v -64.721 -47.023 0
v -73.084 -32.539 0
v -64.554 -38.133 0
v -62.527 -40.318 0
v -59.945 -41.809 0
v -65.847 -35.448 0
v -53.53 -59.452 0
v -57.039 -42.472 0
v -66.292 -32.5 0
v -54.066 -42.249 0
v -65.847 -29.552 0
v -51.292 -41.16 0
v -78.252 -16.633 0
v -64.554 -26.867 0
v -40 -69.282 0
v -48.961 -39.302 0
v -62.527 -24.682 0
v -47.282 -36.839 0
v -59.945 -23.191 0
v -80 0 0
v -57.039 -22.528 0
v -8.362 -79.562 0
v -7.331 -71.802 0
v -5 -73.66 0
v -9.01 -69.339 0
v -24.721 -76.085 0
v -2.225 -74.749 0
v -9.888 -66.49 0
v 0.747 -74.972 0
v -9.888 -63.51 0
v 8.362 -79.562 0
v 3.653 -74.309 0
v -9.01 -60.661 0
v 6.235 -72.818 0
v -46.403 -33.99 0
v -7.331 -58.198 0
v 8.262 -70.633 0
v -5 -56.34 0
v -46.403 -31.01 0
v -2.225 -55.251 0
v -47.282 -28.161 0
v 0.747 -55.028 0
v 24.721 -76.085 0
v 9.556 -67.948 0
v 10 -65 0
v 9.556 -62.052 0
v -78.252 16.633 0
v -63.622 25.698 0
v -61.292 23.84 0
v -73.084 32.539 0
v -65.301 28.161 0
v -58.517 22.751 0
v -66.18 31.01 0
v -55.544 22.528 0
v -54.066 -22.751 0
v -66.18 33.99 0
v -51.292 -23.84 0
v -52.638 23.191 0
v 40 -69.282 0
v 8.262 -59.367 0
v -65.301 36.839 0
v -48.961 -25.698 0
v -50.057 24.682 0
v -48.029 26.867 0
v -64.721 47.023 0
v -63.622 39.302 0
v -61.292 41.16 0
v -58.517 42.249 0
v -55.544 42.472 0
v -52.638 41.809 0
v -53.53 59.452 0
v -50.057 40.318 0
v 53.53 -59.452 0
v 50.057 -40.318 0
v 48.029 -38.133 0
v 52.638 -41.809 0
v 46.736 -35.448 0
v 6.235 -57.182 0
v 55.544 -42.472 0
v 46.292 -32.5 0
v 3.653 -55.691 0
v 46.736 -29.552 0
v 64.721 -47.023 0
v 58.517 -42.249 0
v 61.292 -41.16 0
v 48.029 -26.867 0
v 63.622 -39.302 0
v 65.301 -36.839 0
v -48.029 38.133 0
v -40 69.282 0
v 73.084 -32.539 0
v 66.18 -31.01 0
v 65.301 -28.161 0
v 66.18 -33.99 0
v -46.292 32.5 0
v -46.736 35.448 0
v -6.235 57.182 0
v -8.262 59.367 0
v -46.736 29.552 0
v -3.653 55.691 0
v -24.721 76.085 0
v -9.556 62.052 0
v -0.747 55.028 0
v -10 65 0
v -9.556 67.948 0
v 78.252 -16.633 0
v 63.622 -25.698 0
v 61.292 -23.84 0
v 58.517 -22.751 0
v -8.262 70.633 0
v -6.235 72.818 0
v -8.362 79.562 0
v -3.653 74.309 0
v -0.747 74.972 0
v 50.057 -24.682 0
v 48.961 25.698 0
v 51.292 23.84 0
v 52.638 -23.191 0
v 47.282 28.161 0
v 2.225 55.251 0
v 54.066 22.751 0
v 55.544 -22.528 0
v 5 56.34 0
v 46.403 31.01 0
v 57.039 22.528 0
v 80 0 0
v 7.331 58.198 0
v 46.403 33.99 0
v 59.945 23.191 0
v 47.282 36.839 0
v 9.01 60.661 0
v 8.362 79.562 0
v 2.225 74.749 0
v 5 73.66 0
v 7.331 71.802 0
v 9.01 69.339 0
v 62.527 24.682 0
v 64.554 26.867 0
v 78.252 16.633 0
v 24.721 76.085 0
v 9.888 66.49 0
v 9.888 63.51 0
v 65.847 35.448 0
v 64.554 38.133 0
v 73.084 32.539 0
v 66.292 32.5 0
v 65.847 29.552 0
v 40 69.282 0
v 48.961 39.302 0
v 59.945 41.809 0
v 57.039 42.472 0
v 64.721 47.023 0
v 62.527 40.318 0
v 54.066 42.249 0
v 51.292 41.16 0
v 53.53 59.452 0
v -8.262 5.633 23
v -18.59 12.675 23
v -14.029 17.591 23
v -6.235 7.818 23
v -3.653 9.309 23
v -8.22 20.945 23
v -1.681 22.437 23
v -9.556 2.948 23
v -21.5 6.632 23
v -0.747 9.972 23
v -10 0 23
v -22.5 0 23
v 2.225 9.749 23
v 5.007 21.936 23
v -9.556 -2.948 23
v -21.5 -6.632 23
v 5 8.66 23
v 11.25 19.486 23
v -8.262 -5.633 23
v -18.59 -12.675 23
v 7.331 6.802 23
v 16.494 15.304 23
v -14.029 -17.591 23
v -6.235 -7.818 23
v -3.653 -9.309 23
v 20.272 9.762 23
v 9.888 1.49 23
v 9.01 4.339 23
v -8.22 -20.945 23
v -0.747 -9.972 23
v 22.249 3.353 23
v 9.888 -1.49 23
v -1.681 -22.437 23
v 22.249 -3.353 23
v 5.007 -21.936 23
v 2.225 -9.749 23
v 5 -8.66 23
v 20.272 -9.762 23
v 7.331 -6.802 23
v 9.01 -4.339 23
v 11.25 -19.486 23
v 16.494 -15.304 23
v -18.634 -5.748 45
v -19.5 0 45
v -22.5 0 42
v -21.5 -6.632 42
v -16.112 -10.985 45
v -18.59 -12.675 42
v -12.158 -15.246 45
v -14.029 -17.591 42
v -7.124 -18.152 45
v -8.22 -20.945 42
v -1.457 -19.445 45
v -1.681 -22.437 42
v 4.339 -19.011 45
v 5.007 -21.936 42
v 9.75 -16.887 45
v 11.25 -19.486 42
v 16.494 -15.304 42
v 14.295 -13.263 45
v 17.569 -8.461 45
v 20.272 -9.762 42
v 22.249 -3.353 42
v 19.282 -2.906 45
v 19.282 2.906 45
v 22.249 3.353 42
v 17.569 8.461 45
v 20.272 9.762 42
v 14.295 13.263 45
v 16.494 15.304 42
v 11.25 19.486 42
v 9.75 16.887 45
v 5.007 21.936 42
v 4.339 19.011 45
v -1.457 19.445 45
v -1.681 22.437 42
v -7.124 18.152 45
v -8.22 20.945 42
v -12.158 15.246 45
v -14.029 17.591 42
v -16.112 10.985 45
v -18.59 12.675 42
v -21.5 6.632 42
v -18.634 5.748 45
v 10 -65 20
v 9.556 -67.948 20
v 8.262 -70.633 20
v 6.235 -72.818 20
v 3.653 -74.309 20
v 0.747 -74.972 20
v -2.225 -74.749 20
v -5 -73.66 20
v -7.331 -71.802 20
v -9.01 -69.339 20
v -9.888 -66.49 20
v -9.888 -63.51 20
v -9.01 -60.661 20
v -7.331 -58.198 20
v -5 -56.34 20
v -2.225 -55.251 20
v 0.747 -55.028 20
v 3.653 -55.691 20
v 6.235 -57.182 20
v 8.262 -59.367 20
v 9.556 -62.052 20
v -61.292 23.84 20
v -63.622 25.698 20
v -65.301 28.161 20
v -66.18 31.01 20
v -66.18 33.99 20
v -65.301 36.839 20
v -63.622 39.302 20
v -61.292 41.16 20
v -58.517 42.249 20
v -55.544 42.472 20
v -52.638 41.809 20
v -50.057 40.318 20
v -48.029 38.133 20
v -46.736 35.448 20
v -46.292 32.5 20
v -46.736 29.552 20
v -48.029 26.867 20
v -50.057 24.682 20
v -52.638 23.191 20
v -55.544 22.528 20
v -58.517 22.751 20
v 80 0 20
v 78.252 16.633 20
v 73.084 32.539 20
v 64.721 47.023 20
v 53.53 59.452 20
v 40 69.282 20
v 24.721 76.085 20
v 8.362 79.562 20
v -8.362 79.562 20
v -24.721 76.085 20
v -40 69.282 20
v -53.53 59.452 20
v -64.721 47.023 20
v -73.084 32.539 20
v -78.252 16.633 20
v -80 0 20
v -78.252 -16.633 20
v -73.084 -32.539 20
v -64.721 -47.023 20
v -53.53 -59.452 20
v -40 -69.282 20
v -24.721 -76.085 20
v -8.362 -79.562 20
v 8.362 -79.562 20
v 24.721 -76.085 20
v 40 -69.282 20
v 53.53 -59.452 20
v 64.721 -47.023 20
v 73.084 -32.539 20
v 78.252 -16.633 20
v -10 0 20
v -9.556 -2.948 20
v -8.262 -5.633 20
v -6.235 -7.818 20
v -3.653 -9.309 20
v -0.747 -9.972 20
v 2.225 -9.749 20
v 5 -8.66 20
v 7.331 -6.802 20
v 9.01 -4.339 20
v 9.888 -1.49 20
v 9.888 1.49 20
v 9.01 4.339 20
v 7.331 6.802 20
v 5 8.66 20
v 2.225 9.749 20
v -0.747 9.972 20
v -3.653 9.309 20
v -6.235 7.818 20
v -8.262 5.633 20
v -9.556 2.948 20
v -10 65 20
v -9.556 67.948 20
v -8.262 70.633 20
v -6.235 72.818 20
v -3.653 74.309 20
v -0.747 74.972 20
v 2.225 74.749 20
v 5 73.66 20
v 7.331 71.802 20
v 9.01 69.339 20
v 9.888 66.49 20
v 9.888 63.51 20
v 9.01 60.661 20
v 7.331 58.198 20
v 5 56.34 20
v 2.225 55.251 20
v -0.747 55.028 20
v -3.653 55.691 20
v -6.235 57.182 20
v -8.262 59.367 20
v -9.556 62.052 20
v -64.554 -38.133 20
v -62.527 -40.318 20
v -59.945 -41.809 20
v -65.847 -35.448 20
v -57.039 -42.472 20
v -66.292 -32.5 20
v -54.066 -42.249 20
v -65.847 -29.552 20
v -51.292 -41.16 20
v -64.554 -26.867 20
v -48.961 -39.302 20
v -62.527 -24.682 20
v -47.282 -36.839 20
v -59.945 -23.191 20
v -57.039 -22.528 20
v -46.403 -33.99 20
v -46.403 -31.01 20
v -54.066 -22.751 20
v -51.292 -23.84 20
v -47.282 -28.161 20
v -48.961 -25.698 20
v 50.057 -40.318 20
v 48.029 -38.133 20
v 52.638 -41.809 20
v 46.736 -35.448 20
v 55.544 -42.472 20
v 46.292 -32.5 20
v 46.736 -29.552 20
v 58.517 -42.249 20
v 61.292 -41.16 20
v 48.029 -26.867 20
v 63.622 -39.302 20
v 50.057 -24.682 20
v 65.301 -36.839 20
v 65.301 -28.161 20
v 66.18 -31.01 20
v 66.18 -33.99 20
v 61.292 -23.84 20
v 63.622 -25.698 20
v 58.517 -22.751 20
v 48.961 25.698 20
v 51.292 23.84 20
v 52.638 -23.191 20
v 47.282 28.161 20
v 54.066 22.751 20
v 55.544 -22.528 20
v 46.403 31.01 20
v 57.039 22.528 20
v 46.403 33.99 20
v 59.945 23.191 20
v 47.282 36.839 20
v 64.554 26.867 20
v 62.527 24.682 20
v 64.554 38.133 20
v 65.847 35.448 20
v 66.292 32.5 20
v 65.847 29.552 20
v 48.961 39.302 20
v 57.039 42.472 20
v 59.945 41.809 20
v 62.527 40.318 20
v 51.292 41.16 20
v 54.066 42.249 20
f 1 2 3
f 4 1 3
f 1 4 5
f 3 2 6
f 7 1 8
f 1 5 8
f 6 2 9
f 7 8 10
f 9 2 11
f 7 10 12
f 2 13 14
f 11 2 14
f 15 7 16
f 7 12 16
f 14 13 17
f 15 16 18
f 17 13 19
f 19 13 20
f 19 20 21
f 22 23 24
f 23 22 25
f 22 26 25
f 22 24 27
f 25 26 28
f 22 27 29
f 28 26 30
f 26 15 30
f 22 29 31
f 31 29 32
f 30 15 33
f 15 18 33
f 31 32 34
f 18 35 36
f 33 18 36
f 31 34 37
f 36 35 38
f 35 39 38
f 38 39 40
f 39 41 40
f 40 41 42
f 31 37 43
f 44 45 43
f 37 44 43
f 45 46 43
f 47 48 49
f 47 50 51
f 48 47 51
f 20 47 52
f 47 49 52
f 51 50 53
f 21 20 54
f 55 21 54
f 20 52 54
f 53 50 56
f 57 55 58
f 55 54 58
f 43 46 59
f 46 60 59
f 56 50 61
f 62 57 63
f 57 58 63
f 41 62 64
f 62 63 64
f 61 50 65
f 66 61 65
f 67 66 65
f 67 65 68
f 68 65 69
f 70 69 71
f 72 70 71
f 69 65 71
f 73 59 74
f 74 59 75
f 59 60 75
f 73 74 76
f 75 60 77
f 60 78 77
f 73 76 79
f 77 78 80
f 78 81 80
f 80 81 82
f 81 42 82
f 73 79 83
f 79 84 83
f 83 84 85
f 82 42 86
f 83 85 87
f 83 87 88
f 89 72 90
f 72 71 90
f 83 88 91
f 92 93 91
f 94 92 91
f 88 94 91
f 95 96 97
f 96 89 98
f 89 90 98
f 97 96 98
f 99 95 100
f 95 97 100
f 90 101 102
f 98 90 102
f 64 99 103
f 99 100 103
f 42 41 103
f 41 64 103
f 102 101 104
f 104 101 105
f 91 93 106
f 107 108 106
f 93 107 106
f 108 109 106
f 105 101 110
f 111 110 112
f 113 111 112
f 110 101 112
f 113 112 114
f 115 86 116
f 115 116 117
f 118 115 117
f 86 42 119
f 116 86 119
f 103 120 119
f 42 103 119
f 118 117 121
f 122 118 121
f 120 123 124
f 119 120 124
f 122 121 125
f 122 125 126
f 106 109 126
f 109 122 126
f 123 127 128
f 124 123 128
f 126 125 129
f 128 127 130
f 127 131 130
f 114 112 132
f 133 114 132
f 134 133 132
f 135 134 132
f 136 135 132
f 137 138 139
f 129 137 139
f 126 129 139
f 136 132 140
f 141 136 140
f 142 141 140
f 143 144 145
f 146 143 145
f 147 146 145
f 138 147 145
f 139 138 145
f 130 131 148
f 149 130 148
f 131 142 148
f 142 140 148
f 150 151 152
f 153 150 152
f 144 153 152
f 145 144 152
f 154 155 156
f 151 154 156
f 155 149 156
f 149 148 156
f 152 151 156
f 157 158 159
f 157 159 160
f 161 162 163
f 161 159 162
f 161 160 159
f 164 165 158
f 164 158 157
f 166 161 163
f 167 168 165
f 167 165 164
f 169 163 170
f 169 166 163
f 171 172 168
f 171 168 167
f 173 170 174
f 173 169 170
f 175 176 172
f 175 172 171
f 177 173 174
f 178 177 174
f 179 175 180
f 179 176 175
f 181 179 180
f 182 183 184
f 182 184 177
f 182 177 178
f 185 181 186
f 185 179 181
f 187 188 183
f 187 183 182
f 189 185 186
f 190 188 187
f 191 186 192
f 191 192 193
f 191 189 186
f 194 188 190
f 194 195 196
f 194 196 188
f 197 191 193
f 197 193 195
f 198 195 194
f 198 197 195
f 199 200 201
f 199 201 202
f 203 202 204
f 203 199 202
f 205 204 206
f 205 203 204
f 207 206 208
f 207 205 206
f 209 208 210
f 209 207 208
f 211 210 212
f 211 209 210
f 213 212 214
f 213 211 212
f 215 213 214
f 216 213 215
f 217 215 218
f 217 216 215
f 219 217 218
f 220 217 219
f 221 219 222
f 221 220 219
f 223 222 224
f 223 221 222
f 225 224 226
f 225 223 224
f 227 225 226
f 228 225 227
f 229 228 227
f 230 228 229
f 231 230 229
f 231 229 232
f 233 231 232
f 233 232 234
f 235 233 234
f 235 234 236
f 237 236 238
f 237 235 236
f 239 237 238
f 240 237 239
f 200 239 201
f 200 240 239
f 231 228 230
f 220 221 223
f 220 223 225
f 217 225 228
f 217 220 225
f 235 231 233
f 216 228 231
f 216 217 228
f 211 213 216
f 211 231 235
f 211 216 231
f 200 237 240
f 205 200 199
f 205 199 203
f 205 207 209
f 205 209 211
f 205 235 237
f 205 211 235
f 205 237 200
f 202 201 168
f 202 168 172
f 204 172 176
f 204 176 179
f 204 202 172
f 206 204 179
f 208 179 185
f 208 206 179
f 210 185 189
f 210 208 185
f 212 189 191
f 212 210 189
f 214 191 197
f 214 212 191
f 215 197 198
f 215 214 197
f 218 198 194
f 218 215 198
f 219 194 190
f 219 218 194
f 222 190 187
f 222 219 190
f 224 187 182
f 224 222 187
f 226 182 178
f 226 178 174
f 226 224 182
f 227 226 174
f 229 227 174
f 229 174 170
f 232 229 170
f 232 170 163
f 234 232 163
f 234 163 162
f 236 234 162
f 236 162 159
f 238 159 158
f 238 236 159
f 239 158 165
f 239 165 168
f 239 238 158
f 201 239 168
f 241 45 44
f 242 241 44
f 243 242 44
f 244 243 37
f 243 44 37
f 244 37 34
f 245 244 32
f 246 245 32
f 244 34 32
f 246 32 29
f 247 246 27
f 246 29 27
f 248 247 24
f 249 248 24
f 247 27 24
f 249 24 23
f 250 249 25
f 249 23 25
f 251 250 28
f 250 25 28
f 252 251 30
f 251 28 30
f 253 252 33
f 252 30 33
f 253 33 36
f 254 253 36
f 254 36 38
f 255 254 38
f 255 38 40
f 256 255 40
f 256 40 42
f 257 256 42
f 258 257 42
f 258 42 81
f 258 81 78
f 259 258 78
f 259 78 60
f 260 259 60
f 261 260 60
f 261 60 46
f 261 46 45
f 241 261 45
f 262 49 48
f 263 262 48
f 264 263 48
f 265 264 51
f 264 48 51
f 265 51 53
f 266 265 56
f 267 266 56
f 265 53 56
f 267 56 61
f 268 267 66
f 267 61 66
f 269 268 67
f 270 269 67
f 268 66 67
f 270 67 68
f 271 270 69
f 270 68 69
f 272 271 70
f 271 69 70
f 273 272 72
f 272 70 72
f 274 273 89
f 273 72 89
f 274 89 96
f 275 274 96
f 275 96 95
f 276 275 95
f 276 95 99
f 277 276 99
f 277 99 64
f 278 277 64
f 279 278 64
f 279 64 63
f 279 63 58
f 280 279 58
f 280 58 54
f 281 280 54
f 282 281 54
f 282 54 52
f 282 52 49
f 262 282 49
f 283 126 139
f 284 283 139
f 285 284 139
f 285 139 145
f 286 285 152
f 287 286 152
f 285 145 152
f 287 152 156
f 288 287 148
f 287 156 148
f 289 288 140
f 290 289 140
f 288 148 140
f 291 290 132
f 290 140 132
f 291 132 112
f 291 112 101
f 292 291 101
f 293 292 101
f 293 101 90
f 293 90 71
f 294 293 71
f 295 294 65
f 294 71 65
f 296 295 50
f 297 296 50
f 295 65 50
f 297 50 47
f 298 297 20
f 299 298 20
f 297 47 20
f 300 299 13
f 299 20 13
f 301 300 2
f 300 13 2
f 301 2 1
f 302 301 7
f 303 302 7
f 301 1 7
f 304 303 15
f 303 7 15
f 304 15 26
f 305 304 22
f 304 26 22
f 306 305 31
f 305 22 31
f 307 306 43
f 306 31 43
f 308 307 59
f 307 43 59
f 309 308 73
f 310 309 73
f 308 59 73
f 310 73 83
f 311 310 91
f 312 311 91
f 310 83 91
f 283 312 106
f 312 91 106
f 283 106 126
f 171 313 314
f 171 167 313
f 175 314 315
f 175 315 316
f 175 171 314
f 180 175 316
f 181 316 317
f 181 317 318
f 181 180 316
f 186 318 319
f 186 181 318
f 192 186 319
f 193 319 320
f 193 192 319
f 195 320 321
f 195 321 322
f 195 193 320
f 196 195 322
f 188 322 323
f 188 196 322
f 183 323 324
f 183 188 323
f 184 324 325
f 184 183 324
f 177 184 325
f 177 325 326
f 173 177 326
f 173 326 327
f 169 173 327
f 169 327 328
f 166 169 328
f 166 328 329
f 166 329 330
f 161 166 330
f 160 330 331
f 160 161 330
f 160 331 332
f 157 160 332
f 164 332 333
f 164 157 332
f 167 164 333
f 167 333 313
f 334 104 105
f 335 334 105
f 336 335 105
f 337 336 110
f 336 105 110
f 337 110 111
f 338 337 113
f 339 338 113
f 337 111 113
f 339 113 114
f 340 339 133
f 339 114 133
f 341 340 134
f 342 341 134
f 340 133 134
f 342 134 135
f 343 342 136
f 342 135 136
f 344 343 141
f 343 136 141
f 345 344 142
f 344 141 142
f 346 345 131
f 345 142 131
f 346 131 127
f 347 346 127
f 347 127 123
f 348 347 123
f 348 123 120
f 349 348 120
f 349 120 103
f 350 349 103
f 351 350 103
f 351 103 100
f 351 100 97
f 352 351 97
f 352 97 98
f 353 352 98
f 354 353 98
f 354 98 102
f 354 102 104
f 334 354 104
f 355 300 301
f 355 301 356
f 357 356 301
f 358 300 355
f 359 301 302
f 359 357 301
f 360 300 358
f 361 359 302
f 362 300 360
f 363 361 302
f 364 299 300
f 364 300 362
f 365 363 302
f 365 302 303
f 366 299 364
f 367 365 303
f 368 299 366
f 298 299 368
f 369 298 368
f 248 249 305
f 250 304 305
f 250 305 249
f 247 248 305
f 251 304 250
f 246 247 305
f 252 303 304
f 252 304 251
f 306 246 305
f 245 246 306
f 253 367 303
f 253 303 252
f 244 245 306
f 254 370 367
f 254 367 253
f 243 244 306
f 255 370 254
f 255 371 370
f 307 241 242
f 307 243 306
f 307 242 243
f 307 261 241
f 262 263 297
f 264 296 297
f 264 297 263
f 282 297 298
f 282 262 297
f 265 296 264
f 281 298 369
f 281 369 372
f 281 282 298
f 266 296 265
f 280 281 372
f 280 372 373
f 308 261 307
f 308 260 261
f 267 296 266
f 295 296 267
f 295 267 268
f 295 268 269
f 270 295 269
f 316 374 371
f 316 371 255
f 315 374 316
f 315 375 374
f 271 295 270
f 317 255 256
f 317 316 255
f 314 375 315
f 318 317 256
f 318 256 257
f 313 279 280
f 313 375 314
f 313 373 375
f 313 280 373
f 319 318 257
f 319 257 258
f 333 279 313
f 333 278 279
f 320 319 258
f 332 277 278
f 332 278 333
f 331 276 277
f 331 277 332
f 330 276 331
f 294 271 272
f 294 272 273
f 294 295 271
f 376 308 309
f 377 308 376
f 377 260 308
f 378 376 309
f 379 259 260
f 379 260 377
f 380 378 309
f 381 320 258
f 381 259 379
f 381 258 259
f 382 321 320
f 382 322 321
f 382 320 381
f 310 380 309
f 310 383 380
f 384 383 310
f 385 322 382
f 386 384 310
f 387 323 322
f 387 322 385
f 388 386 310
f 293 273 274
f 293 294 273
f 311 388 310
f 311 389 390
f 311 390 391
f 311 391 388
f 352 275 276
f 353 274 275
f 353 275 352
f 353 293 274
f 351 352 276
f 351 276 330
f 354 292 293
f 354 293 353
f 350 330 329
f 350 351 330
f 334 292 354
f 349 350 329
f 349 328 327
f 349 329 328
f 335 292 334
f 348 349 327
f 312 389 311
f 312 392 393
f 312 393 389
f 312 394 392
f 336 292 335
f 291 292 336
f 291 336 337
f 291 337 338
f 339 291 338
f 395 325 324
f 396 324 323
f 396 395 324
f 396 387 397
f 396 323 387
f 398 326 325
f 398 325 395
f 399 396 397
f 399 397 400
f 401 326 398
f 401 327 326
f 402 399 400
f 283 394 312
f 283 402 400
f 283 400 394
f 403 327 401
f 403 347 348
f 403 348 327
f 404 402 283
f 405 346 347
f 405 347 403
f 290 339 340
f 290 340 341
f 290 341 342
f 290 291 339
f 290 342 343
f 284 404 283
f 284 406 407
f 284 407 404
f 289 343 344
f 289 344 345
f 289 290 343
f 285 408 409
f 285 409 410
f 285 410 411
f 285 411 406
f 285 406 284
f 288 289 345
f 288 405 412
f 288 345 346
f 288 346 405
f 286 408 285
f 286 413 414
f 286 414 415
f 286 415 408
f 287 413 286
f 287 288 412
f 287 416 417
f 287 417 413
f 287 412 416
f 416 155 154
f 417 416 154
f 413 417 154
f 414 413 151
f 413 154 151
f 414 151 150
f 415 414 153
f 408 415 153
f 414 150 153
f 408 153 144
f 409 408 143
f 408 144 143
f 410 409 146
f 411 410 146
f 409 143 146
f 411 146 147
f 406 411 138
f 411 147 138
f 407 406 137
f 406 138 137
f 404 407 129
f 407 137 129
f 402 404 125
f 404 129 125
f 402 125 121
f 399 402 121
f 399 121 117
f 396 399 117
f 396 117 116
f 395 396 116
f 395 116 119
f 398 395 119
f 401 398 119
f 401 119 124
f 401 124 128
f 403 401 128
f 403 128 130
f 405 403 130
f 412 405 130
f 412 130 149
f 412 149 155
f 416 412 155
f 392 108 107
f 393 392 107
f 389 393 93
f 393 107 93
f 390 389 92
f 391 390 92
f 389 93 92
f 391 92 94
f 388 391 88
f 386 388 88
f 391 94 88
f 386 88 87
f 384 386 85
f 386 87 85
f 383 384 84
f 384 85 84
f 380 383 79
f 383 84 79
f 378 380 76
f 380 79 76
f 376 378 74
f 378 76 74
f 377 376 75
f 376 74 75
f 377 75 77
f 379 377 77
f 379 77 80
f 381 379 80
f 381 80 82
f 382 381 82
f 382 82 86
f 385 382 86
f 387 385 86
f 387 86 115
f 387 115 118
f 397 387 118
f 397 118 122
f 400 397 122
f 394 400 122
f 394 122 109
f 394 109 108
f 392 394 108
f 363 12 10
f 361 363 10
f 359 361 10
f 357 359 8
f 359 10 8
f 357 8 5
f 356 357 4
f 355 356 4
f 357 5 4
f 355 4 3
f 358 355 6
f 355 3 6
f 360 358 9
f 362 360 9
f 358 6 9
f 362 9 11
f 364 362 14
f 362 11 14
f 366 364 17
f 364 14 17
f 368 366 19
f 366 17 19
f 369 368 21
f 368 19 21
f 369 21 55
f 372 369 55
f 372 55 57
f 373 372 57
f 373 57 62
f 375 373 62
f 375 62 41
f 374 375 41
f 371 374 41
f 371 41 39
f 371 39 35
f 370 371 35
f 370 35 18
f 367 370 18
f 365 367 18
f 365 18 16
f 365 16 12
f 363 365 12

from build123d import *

# Parameters (mm, degrees)
SKETCH1_R               = 80
BASE_EXTRUDE_DEPTH      = 20
CHAMFER1_SIZE           = 3
HOLE_WIZARD_20_0_20_1_D = 20
CIRPATTERN2_COUNT       = 6


with BuildPart() as part:
    # Sketch1 → Base-Extrude (new body)
    with BuildSketch(Plane.XY):
        Circle(SKETCH1_R)
    extrude(amount=BASE_EXTRUDE_DEPTH)

    # Sketch2 → Boss-Revolve1 (revolve)
    with BuildSketch(Plane(origin=(0, 0, 0), x_dir=(1, 0, 0), z_dir=(0, 1, 0))):
        Polygon((-10, -20), (-10, -23), (-22.5, -23), (-22.5, -45), (0, -45), (0, -20), align=None)
    revolve(axis=Axis((0, 0, 0), (0, 0, 1)))

    # Chamfer1
    chamfer1_edges = [part.edges().sort_by_distance(p)[0] for p in [
        (22.5, 0, 45),
    ]]
    chamfer(chamfer1_edges, length=CHAMFER1_SIZE)

    # Ø20.0 (20) 直徑孔1 (through all)
    with Locations(Plane(origin=(0, 65, 20), x_dir=(1, 0, 0), z_dir=(0, 0, 1))):
        with Locations((0, 0)):
            hole_wizard_20_0_20_1 = Hole(HOLE_WIZARD_20_0_20_1_D / 2)

    # CirPattern2: Ø20.0 (20) 直徑孔1 ×6 about axis
    cirpattern2_axis = Axis((0, 0, 0), (0, 0, 1))
    for i in range(1, CIRPATTERN2_COUNT):
        add(hole_wizard_20_0_20_1.rotate(cirpattern2_axis, i * 360 / CIRPATTERN2_COUNT), mode=Mode.SUBTRACT)


solid = part.part
